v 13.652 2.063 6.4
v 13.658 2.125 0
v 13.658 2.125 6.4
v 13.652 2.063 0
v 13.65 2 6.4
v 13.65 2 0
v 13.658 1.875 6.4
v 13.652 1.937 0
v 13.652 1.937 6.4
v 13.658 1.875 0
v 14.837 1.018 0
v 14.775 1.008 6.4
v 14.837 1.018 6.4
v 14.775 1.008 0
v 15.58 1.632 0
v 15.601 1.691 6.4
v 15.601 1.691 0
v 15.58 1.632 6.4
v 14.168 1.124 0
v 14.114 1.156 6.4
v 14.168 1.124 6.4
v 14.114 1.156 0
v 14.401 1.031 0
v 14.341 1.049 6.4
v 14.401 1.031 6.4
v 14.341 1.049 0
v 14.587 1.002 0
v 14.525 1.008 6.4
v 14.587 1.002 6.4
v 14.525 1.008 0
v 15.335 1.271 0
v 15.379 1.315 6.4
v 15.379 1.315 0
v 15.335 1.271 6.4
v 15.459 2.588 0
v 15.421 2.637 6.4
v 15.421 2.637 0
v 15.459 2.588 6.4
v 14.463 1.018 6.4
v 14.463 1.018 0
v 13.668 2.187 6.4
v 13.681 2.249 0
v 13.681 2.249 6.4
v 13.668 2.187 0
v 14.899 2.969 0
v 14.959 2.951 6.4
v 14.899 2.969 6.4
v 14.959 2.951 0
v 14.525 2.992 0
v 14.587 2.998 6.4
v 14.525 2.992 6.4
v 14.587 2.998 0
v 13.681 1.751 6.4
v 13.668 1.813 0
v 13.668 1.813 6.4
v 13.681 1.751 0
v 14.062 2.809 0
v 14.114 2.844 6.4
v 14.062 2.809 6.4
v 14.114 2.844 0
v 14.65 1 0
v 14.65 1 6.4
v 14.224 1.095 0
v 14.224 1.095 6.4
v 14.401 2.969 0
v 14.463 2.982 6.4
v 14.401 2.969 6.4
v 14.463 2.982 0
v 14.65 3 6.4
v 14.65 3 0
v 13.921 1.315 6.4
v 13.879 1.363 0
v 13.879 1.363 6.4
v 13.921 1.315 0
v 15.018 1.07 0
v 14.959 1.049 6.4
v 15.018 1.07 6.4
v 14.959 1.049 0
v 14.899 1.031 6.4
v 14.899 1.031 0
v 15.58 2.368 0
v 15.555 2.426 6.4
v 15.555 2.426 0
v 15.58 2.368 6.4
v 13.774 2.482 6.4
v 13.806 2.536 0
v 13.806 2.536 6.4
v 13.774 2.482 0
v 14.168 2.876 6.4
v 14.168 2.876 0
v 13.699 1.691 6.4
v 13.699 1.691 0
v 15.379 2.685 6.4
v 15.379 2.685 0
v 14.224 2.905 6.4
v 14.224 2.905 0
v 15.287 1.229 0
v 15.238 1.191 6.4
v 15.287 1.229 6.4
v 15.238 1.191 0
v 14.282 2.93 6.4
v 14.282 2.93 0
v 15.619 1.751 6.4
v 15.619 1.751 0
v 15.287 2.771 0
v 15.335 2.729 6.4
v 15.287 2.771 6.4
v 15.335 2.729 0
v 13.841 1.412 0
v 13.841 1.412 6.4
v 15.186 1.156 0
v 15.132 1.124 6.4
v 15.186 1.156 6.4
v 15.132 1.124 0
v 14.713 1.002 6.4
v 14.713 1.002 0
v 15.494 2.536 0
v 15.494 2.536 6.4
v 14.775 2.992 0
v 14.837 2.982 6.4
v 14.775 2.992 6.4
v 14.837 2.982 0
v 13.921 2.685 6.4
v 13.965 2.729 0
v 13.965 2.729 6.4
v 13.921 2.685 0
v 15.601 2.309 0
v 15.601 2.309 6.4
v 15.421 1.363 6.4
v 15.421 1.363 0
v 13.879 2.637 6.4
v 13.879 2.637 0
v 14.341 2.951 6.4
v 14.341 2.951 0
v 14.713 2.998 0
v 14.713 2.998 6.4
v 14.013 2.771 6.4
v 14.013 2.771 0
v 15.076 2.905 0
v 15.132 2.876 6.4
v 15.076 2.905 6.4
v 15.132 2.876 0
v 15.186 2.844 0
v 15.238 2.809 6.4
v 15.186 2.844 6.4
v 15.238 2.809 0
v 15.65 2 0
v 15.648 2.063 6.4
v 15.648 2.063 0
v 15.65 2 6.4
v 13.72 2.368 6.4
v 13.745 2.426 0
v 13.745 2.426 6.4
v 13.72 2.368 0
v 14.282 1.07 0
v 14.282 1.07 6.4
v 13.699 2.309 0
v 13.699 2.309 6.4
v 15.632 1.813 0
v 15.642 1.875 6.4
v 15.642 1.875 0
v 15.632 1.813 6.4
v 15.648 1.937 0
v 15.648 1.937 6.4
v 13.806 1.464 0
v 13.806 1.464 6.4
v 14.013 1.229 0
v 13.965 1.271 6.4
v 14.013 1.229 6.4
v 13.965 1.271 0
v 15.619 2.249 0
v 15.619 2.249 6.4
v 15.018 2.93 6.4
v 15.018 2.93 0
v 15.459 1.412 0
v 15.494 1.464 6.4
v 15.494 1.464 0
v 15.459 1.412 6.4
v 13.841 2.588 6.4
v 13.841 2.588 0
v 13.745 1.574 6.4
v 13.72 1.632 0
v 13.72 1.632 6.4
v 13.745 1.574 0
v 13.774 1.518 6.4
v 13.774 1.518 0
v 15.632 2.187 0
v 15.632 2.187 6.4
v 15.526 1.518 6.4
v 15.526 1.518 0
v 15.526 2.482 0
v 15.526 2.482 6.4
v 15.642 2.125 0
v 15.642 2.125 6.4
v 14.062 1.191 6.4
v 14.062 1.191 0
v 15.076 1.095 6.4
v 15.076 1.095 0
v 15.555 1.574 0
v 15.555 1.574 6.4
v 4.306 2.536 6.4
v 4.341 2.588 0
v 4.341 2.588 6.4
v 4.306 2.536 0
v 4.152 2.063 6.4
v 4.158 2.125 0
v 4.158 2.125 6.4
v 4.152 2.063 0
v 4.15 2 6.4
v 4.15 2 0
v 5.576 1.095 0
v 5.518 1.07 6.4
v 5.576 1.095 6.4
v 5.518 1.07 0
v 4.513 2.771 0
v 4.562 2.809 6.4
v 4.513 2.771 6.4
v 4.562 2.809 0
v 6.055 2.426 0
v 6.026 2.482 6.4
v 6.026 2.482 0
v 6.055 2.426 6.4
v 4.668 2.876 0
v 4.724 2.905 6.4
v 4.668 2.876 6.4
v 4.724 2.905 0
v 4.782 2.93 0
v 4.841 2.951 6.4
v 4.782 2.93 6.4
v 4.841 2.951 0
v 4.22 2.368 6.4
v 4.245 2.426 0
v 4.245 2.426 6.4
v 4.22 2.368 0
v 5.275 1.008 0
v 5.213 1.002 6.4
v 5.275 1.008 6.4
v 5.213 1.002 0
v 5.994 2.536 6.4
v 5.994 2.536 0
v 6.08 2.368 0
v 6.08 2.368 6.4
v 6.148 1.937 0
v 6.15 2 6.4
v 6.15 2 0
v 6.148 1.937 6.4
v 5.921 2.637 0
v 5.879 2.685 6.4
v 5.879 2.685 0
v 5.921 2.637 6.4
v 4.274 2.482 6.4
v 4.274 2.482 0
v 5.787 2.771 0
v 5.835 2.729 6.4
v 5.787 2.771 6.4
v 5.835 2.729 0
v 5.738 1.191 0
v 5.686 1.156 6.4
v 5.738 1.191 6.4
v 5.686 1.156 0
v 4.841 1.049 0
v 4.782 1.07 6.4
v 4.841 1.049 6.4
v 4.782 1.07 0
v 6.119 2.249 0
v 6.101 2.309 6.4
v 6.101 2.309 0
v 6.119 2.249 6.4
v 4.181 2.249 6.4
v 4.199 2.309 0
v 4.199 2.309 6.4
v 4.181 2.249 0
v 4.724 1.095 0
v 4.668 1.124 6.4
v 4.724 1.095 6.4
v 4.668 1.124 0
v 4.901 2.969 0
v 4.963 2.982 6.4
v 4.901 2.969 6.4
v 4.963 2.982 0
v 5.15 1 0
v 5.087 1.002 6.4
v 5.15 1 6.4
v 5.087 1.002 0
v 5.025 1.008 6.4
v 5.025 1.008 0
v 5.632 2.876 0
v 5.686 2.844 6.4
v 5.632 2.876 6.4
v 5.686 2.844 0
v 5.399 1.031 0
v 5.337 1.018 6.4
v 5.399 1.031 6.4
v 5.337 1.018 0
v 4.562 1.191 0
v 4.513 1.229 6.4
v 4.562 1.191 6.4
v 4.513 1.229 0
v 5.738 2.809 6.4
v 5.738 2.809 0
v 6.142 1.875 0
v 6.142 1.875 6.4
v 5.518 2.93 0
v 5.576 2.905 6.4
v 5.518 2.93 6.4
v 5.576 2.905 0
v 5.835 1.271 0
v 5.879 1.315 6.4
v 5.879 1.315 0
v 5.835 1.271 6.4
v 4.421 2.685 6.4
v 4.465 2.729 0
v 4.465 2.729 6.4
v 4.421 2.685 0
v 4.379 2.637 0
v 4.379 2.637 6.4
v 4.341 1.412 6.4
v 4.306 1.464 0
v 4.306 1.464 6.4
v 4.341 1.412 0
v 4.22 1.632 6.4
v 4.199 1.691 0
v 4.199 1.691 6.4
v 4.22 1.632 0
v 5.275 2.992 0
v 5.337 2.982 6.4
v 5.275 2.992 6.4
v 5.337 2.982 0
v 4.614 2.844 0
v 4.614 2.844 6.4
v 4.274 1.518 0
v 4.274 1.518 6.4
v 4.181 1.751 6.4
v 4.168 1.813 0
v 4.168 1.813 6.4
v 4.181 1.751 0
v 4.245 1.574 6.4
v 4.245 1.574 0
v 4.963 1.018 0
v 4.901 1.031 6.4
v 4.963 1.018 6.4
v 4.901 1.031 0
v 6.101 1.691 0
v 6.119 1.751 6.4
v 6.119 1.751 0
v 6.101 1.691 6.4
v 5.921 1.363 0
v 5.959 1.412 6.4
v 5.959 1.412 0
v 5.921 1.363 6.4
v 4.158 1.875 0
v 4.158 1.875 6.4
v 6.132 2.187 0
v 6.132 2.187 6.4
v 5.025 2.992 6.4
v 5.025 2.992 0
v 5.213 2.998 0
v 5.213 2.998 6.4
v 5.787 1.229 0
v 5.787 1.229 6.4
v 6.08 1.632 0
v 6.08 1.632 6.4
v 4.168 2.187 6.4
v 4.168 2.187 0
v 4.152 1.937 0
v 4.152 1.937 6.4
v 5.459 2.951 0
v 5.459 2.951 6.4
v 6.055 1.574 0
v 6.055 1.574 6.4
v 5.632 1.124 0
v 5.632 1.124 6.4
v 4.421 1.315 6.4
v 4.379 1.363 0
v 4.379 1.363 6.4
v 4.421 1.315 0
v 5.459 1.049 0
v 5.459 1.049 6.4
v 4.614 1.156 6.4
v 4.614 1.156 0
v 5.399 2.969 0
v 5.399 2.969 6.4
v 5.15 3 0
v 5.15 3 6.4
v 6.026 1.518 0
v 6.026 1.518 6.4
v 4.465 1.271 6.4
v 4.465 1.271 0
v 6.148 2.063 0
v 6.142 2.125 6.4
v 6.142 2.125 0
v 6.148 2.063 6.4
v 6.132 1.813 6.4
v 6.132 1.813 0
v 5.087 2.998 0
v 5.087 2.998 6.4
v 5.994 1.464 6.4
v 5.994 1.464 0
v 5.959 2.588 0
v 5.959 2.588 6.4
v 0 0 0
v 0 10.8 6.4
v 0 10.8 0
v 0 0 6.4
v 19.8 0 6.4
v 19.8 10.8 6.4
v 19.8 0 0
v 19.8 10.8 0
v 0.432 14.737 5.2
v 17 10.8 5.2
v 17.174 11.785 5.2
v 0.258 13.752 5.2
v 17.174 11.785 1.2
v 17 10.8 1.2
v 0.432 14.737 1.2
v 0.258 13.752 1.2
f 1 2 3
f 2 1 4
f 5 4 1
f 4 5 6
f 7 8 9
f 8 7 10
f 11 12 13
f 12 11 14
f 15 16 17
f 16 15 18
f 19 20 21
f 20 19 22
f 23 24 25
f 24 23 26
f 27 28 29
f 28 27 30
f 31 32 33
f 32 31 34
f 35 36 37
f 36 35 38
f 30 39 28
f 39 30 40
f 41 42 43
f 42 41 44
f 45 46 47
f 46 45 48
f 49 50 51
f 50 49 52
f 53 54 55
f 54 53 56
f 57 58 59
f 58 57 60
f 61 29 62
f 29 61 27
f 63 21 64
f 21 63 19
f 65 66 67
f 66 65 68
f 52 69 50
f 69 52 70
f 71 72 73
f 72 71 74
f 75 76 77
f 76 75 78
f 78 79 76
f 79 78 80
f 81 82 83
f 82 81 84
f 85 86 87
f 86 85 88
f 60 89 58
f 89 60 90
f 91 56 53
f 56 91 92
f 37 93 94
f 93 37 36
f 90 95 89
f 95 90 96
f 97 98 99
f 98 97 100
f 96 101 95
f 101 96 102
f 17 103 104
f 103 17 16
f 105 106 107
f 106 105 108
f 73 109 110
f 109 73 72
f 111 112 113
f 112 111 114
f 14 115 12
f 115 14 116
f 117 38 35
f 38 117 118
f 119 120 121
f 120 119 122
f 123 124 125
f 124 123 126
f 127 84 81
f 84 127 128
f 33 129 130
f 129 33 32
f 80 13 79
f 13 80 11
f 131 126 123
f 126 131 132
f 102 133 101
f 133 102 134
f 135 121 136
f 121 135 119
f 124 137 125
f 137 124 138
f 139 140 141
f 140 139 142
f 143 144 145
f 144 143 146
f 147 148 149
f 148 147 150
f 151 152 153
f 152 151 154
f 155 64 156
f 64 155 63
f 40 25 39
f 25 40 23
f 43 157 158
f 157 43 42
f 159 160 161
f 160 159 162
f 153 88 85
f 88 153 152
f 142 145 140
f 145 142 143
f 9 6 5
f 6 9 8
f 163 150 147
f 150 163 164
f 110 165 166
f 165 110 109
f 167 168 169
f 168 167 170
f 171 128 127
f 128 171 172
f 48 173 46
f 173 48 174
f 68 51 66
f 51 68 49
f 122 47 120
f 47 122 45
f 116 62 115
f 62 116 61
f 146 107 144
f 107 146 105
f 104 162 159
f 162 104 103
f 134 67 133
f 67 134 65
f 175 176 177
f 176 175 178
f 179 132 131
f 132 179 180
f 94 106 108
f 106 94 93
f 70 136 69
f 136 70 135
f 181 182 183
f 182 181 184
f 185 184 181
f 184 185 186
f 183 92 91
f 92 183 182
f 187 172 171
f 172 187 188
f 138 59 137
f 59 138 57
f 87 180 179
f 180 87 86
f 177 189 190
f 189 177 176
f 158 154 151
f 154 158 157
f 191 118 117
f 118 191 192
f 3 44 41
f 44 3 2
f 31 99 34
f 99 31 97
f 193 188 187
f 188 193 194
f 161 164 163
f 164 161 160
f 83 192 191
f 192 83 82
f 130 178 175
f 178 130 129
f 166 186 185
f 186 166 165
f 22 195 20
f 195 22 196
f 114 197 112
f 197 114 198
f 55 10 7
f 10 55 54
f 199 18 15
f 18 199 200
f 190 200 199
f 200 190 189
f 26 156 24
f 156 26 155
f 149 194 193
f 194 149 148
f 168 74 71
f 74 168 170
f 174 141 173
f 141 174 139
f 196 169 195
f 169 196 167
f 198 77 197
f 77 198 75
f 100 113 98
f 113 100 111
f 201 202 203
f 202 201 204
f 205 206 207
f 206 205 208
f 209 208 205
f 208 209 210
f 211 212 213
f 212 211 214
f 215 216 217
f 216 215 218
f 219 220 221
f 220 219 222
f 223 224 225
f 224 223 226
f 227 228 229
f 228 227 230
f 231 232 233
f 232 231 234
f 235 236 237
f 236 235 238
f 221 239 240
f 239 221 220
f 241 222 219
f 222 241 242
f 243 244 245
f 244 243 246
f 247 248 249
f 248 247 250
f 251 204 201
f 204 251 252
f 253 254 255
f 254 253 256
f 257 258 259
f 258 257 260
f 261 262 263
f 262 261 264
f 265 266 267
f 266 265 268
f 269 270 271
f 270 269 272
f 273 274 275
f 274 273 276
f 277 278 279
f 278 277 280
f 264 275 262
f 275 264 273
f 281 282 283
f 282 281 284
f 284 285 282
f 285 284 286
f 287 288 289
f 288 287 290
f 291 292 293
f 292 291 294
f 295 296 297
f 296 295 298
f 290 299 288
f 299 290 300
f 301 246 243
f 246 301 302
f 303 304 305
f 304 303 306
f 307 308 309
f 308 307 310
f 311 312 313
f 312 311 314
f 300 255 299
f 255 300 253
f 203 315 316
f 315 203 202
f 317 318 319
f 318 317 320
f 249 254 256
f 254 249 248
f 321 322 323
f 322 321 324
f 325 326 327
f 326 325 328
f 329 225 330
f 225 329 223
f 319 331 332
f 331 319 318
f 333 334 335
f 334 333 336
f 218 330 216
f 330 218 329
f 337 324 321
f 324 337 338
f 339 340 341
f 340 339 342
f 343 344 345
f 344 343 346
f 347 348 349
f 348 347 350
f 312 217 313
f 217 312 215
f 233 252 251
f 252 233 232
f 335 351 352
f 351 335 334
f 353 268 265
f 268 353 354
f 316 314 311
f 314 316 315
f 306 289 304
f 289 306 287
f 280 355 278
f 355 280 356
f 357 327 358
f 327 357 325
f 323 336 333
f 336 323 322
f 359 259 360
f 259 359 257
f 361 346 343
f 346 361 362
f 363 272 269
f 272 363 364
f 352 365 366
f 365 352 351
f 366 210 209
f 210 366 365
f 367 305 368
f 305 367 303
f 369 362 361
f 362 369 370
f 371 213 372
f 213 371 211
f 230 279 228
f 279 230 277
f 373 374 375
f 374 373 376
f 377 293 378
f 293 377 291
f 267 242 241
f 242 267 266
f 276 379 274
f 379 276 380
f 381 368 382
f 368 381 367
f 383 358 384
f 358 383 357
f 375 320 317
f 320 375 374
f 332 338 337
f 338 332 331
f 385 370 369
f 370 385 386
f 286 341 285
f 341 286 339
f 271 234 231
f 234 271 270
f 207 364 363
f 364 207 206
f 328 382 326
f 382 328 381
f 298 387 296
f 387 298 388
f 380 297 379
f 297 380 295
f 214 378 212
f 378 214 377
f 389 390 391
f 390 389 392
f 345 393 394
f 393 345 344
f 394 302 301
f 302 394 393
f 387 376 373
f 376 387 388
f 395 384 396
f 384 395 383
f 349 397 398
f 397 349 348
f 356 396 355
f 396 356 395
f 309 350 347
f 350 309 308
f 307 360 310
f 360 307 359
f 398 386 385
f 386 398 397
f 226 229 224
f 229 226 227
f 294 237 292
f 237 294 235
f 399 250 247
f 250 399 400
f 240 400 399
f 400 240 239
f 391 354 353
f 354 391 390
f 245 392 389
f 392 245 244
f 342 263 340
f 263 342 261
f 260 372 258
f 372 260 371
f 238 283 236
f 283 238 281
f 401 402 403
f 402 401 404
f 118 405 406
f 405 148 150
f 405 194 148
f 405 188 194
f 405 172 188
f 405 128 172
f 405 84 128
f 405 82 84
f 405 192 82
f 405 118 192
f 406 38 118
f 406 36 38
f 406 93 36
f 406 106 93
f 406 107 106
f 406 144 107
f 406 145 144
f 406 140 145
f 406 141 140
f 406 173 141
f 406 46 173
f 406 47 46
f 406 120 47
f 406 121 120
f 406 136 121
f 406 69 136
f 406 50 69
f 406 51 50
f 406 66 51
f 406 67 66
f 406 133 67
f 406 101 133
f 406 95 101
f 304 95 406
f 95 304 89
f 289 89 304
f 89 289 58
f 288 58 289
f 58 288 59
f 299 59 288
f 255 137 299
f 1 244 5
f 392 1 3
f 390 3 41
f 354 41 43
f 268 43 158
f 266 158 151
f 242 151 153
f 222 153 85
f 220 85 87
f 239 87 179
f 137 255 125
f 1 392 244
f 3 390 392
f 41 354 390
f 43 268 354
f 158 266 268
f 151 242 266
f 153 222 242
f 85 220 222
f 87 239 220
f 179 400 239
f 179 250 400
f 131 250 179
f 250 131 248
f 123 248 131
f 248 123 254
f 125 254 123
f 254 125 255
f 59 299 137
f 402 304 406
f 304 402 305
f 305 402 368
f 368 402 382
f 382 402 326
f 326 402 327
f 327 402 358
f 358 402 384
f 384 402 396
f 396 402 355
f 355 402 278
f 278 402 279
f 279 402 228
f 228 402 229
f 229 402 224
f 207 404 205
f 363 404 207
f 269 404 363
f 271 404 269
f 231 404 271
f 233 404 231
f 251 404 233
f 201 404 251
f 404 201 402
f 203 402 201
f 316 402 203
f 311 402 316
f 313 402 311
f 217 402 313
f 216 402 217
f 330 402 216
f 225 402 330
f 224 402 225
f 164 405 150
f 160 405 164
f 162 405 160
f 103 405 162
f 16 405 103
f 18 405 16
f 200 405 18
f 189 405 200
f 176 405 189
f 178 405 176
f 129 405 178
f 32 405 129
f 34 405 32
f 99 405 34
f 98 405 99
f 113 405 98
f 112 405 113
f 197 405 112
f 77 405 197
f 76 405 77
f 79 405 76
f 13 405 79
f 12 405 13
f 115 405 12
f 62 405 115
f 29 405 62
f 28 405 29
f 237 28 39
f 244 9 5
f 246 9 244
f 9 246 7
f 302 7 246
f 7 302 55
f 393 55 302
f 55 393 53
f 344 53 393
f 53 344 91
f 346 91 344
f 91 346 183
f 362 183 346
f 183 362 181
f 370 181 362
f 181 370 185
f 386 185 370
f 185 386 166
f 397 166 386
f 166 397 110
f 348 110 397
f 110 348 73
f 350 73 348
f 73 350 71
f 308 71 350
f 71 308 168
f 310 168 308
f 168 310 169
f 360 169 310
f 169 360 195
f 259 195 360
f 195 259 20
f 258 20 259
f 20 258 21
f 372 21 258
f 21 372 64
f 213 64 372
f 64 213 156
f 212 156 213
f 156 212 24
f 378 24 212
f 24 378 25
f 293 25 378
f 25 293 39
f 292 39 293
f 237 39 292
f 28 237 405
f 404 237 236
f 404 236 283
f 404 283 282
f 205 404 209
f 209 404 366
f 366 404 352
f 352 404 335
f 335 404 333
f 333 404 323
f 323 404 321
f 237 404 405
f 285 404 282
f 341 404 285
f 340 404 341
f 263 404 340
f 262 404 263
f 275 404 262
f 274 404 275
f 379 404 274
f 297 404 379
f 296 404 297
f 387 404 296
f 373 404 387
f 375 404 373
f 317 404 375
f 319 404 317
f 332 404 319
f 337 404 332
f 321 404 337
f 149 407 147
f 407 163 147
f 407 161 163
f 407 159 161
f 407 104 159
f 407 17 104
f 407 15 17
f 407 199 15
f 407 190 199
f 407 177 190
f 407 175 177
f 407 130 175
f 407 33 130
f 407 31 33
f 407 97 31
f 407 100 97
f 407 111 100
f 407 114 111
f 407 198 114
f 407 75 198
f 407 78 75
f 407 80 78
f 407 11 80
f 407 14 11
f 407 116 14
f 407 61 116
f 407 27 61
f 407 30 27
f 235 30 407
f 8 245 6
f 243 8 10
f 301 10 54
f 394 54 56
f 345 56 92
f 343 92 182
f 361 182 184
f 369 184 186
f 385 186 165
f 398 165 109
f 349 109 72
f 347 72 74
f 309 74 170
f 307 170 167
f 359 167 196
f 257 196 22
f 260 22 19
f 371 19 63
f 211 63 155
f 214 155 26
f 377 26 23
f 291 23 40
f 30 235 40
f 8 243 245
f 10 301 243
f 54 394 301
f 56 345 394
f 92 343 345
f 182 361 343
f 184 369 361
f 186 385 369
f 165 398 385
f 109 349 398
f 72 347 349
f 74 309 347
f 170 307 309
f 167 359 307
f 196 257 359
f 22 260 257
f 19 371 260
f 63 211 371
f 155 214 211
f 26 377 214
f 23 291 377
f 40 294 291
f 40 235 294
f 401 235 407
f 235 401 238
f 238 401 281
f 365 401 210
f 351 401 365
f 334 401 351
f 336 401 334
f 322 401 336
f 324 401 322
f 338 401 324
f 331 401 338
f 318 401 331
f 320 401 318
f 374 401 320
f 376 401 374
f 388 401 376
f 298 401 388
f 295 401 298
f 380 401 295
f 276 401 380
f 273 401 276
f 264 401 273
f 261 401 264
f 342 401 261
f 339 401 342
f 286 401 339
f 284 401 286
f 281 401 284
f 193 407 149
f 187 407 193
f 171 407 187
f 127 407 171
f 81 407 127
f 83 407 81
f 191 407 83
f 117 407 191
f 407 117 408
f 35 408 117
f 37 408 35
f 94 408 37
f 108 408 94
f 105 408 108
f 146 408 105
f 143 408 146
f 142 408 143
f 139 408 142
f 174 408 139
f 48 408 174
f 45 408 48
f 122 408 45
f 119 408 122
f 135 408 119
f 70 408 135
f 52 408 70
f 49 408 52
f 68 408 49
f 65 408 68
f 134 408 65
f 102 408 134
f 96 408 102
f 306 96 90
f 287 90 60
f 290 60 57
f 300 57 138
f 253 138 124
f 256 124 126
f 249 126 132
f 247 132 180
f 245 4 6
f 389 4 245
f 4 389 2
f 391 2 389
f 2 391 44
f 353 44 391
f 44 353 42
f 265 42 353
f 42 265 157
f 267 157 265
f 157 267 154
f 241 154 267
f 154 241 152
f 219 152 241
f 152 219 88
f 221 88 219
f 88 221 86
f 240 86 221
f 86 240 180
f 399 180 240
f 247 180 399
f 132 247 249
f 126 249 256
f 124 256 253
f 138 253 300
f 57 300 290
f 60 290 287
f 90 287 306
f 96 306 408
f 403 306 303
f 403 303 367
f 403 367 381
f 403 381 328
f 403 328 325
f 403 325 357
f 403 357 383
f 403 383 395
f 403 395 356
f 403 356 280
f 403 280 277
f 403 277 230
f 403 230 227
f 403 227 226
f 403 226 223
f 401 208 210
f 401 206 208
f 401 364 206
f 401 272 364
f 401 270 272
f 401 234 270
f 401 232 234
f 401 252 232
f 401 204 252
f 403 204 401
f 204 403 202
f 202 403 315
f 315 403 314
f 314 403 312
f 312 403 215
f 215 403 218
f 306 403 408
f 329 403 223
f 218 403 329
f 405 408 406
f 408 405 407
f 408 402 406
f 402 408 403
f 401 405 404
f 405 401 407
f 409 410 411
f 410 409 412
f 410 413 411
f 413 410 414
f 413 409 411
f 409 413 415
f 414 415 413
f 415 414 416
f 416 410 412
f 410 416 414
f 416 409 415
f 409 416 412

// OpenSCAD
include <MCAD/materials.scad>
include <MCAD/metric_fastners.scad>

module micro_switch(with_extra_parts=false, exploded=false) {
  scale([-1,1,1]) translate([-19.8, 0, 0]){
    difference() {
      color(BlackPaint) cube([19.8, 10.8, 6.4]);

      translate([5.15, 2, 0]) {
        translate([0, 0, -0.5])
          cylinder(h = 7.4, R=2.6, $fn=100);
        translate([9.5, 0, -0.5])
        cylinder(h = 7.4, R=2.6, $fn=100);
      }
    }
    translate([2.8, 10.8, 1.2])
      rotate([0,0,10])
        color(Steel) cube([17,1,4]);

    if(with_extra_parts)
      micro_switch_extras(exploded_distance=(exploded?15:0));
  }

  module micro_switch_extras(exploded_distance=0) {
    screw_size = 2.2;
    screw_length = 13;
    echo("Non-Plastic Parts, 2, Self Tapping Screw 2.2 x 13 mm for micro switch");
    translate([5.15, 2, 0]) color(Steel) {
      translate([0, 0, 0.5+6.4+exploded_distance])
        rotate([180,0,0]) csk_bolt(screw_size, screw_length);
      translate([9.5, 0, 0.5+6.4+exploded_distance])
        rotate([180,0,0]) csk_bolt(screw_size, screw_length);
    }
  }

}


micro_switch();
